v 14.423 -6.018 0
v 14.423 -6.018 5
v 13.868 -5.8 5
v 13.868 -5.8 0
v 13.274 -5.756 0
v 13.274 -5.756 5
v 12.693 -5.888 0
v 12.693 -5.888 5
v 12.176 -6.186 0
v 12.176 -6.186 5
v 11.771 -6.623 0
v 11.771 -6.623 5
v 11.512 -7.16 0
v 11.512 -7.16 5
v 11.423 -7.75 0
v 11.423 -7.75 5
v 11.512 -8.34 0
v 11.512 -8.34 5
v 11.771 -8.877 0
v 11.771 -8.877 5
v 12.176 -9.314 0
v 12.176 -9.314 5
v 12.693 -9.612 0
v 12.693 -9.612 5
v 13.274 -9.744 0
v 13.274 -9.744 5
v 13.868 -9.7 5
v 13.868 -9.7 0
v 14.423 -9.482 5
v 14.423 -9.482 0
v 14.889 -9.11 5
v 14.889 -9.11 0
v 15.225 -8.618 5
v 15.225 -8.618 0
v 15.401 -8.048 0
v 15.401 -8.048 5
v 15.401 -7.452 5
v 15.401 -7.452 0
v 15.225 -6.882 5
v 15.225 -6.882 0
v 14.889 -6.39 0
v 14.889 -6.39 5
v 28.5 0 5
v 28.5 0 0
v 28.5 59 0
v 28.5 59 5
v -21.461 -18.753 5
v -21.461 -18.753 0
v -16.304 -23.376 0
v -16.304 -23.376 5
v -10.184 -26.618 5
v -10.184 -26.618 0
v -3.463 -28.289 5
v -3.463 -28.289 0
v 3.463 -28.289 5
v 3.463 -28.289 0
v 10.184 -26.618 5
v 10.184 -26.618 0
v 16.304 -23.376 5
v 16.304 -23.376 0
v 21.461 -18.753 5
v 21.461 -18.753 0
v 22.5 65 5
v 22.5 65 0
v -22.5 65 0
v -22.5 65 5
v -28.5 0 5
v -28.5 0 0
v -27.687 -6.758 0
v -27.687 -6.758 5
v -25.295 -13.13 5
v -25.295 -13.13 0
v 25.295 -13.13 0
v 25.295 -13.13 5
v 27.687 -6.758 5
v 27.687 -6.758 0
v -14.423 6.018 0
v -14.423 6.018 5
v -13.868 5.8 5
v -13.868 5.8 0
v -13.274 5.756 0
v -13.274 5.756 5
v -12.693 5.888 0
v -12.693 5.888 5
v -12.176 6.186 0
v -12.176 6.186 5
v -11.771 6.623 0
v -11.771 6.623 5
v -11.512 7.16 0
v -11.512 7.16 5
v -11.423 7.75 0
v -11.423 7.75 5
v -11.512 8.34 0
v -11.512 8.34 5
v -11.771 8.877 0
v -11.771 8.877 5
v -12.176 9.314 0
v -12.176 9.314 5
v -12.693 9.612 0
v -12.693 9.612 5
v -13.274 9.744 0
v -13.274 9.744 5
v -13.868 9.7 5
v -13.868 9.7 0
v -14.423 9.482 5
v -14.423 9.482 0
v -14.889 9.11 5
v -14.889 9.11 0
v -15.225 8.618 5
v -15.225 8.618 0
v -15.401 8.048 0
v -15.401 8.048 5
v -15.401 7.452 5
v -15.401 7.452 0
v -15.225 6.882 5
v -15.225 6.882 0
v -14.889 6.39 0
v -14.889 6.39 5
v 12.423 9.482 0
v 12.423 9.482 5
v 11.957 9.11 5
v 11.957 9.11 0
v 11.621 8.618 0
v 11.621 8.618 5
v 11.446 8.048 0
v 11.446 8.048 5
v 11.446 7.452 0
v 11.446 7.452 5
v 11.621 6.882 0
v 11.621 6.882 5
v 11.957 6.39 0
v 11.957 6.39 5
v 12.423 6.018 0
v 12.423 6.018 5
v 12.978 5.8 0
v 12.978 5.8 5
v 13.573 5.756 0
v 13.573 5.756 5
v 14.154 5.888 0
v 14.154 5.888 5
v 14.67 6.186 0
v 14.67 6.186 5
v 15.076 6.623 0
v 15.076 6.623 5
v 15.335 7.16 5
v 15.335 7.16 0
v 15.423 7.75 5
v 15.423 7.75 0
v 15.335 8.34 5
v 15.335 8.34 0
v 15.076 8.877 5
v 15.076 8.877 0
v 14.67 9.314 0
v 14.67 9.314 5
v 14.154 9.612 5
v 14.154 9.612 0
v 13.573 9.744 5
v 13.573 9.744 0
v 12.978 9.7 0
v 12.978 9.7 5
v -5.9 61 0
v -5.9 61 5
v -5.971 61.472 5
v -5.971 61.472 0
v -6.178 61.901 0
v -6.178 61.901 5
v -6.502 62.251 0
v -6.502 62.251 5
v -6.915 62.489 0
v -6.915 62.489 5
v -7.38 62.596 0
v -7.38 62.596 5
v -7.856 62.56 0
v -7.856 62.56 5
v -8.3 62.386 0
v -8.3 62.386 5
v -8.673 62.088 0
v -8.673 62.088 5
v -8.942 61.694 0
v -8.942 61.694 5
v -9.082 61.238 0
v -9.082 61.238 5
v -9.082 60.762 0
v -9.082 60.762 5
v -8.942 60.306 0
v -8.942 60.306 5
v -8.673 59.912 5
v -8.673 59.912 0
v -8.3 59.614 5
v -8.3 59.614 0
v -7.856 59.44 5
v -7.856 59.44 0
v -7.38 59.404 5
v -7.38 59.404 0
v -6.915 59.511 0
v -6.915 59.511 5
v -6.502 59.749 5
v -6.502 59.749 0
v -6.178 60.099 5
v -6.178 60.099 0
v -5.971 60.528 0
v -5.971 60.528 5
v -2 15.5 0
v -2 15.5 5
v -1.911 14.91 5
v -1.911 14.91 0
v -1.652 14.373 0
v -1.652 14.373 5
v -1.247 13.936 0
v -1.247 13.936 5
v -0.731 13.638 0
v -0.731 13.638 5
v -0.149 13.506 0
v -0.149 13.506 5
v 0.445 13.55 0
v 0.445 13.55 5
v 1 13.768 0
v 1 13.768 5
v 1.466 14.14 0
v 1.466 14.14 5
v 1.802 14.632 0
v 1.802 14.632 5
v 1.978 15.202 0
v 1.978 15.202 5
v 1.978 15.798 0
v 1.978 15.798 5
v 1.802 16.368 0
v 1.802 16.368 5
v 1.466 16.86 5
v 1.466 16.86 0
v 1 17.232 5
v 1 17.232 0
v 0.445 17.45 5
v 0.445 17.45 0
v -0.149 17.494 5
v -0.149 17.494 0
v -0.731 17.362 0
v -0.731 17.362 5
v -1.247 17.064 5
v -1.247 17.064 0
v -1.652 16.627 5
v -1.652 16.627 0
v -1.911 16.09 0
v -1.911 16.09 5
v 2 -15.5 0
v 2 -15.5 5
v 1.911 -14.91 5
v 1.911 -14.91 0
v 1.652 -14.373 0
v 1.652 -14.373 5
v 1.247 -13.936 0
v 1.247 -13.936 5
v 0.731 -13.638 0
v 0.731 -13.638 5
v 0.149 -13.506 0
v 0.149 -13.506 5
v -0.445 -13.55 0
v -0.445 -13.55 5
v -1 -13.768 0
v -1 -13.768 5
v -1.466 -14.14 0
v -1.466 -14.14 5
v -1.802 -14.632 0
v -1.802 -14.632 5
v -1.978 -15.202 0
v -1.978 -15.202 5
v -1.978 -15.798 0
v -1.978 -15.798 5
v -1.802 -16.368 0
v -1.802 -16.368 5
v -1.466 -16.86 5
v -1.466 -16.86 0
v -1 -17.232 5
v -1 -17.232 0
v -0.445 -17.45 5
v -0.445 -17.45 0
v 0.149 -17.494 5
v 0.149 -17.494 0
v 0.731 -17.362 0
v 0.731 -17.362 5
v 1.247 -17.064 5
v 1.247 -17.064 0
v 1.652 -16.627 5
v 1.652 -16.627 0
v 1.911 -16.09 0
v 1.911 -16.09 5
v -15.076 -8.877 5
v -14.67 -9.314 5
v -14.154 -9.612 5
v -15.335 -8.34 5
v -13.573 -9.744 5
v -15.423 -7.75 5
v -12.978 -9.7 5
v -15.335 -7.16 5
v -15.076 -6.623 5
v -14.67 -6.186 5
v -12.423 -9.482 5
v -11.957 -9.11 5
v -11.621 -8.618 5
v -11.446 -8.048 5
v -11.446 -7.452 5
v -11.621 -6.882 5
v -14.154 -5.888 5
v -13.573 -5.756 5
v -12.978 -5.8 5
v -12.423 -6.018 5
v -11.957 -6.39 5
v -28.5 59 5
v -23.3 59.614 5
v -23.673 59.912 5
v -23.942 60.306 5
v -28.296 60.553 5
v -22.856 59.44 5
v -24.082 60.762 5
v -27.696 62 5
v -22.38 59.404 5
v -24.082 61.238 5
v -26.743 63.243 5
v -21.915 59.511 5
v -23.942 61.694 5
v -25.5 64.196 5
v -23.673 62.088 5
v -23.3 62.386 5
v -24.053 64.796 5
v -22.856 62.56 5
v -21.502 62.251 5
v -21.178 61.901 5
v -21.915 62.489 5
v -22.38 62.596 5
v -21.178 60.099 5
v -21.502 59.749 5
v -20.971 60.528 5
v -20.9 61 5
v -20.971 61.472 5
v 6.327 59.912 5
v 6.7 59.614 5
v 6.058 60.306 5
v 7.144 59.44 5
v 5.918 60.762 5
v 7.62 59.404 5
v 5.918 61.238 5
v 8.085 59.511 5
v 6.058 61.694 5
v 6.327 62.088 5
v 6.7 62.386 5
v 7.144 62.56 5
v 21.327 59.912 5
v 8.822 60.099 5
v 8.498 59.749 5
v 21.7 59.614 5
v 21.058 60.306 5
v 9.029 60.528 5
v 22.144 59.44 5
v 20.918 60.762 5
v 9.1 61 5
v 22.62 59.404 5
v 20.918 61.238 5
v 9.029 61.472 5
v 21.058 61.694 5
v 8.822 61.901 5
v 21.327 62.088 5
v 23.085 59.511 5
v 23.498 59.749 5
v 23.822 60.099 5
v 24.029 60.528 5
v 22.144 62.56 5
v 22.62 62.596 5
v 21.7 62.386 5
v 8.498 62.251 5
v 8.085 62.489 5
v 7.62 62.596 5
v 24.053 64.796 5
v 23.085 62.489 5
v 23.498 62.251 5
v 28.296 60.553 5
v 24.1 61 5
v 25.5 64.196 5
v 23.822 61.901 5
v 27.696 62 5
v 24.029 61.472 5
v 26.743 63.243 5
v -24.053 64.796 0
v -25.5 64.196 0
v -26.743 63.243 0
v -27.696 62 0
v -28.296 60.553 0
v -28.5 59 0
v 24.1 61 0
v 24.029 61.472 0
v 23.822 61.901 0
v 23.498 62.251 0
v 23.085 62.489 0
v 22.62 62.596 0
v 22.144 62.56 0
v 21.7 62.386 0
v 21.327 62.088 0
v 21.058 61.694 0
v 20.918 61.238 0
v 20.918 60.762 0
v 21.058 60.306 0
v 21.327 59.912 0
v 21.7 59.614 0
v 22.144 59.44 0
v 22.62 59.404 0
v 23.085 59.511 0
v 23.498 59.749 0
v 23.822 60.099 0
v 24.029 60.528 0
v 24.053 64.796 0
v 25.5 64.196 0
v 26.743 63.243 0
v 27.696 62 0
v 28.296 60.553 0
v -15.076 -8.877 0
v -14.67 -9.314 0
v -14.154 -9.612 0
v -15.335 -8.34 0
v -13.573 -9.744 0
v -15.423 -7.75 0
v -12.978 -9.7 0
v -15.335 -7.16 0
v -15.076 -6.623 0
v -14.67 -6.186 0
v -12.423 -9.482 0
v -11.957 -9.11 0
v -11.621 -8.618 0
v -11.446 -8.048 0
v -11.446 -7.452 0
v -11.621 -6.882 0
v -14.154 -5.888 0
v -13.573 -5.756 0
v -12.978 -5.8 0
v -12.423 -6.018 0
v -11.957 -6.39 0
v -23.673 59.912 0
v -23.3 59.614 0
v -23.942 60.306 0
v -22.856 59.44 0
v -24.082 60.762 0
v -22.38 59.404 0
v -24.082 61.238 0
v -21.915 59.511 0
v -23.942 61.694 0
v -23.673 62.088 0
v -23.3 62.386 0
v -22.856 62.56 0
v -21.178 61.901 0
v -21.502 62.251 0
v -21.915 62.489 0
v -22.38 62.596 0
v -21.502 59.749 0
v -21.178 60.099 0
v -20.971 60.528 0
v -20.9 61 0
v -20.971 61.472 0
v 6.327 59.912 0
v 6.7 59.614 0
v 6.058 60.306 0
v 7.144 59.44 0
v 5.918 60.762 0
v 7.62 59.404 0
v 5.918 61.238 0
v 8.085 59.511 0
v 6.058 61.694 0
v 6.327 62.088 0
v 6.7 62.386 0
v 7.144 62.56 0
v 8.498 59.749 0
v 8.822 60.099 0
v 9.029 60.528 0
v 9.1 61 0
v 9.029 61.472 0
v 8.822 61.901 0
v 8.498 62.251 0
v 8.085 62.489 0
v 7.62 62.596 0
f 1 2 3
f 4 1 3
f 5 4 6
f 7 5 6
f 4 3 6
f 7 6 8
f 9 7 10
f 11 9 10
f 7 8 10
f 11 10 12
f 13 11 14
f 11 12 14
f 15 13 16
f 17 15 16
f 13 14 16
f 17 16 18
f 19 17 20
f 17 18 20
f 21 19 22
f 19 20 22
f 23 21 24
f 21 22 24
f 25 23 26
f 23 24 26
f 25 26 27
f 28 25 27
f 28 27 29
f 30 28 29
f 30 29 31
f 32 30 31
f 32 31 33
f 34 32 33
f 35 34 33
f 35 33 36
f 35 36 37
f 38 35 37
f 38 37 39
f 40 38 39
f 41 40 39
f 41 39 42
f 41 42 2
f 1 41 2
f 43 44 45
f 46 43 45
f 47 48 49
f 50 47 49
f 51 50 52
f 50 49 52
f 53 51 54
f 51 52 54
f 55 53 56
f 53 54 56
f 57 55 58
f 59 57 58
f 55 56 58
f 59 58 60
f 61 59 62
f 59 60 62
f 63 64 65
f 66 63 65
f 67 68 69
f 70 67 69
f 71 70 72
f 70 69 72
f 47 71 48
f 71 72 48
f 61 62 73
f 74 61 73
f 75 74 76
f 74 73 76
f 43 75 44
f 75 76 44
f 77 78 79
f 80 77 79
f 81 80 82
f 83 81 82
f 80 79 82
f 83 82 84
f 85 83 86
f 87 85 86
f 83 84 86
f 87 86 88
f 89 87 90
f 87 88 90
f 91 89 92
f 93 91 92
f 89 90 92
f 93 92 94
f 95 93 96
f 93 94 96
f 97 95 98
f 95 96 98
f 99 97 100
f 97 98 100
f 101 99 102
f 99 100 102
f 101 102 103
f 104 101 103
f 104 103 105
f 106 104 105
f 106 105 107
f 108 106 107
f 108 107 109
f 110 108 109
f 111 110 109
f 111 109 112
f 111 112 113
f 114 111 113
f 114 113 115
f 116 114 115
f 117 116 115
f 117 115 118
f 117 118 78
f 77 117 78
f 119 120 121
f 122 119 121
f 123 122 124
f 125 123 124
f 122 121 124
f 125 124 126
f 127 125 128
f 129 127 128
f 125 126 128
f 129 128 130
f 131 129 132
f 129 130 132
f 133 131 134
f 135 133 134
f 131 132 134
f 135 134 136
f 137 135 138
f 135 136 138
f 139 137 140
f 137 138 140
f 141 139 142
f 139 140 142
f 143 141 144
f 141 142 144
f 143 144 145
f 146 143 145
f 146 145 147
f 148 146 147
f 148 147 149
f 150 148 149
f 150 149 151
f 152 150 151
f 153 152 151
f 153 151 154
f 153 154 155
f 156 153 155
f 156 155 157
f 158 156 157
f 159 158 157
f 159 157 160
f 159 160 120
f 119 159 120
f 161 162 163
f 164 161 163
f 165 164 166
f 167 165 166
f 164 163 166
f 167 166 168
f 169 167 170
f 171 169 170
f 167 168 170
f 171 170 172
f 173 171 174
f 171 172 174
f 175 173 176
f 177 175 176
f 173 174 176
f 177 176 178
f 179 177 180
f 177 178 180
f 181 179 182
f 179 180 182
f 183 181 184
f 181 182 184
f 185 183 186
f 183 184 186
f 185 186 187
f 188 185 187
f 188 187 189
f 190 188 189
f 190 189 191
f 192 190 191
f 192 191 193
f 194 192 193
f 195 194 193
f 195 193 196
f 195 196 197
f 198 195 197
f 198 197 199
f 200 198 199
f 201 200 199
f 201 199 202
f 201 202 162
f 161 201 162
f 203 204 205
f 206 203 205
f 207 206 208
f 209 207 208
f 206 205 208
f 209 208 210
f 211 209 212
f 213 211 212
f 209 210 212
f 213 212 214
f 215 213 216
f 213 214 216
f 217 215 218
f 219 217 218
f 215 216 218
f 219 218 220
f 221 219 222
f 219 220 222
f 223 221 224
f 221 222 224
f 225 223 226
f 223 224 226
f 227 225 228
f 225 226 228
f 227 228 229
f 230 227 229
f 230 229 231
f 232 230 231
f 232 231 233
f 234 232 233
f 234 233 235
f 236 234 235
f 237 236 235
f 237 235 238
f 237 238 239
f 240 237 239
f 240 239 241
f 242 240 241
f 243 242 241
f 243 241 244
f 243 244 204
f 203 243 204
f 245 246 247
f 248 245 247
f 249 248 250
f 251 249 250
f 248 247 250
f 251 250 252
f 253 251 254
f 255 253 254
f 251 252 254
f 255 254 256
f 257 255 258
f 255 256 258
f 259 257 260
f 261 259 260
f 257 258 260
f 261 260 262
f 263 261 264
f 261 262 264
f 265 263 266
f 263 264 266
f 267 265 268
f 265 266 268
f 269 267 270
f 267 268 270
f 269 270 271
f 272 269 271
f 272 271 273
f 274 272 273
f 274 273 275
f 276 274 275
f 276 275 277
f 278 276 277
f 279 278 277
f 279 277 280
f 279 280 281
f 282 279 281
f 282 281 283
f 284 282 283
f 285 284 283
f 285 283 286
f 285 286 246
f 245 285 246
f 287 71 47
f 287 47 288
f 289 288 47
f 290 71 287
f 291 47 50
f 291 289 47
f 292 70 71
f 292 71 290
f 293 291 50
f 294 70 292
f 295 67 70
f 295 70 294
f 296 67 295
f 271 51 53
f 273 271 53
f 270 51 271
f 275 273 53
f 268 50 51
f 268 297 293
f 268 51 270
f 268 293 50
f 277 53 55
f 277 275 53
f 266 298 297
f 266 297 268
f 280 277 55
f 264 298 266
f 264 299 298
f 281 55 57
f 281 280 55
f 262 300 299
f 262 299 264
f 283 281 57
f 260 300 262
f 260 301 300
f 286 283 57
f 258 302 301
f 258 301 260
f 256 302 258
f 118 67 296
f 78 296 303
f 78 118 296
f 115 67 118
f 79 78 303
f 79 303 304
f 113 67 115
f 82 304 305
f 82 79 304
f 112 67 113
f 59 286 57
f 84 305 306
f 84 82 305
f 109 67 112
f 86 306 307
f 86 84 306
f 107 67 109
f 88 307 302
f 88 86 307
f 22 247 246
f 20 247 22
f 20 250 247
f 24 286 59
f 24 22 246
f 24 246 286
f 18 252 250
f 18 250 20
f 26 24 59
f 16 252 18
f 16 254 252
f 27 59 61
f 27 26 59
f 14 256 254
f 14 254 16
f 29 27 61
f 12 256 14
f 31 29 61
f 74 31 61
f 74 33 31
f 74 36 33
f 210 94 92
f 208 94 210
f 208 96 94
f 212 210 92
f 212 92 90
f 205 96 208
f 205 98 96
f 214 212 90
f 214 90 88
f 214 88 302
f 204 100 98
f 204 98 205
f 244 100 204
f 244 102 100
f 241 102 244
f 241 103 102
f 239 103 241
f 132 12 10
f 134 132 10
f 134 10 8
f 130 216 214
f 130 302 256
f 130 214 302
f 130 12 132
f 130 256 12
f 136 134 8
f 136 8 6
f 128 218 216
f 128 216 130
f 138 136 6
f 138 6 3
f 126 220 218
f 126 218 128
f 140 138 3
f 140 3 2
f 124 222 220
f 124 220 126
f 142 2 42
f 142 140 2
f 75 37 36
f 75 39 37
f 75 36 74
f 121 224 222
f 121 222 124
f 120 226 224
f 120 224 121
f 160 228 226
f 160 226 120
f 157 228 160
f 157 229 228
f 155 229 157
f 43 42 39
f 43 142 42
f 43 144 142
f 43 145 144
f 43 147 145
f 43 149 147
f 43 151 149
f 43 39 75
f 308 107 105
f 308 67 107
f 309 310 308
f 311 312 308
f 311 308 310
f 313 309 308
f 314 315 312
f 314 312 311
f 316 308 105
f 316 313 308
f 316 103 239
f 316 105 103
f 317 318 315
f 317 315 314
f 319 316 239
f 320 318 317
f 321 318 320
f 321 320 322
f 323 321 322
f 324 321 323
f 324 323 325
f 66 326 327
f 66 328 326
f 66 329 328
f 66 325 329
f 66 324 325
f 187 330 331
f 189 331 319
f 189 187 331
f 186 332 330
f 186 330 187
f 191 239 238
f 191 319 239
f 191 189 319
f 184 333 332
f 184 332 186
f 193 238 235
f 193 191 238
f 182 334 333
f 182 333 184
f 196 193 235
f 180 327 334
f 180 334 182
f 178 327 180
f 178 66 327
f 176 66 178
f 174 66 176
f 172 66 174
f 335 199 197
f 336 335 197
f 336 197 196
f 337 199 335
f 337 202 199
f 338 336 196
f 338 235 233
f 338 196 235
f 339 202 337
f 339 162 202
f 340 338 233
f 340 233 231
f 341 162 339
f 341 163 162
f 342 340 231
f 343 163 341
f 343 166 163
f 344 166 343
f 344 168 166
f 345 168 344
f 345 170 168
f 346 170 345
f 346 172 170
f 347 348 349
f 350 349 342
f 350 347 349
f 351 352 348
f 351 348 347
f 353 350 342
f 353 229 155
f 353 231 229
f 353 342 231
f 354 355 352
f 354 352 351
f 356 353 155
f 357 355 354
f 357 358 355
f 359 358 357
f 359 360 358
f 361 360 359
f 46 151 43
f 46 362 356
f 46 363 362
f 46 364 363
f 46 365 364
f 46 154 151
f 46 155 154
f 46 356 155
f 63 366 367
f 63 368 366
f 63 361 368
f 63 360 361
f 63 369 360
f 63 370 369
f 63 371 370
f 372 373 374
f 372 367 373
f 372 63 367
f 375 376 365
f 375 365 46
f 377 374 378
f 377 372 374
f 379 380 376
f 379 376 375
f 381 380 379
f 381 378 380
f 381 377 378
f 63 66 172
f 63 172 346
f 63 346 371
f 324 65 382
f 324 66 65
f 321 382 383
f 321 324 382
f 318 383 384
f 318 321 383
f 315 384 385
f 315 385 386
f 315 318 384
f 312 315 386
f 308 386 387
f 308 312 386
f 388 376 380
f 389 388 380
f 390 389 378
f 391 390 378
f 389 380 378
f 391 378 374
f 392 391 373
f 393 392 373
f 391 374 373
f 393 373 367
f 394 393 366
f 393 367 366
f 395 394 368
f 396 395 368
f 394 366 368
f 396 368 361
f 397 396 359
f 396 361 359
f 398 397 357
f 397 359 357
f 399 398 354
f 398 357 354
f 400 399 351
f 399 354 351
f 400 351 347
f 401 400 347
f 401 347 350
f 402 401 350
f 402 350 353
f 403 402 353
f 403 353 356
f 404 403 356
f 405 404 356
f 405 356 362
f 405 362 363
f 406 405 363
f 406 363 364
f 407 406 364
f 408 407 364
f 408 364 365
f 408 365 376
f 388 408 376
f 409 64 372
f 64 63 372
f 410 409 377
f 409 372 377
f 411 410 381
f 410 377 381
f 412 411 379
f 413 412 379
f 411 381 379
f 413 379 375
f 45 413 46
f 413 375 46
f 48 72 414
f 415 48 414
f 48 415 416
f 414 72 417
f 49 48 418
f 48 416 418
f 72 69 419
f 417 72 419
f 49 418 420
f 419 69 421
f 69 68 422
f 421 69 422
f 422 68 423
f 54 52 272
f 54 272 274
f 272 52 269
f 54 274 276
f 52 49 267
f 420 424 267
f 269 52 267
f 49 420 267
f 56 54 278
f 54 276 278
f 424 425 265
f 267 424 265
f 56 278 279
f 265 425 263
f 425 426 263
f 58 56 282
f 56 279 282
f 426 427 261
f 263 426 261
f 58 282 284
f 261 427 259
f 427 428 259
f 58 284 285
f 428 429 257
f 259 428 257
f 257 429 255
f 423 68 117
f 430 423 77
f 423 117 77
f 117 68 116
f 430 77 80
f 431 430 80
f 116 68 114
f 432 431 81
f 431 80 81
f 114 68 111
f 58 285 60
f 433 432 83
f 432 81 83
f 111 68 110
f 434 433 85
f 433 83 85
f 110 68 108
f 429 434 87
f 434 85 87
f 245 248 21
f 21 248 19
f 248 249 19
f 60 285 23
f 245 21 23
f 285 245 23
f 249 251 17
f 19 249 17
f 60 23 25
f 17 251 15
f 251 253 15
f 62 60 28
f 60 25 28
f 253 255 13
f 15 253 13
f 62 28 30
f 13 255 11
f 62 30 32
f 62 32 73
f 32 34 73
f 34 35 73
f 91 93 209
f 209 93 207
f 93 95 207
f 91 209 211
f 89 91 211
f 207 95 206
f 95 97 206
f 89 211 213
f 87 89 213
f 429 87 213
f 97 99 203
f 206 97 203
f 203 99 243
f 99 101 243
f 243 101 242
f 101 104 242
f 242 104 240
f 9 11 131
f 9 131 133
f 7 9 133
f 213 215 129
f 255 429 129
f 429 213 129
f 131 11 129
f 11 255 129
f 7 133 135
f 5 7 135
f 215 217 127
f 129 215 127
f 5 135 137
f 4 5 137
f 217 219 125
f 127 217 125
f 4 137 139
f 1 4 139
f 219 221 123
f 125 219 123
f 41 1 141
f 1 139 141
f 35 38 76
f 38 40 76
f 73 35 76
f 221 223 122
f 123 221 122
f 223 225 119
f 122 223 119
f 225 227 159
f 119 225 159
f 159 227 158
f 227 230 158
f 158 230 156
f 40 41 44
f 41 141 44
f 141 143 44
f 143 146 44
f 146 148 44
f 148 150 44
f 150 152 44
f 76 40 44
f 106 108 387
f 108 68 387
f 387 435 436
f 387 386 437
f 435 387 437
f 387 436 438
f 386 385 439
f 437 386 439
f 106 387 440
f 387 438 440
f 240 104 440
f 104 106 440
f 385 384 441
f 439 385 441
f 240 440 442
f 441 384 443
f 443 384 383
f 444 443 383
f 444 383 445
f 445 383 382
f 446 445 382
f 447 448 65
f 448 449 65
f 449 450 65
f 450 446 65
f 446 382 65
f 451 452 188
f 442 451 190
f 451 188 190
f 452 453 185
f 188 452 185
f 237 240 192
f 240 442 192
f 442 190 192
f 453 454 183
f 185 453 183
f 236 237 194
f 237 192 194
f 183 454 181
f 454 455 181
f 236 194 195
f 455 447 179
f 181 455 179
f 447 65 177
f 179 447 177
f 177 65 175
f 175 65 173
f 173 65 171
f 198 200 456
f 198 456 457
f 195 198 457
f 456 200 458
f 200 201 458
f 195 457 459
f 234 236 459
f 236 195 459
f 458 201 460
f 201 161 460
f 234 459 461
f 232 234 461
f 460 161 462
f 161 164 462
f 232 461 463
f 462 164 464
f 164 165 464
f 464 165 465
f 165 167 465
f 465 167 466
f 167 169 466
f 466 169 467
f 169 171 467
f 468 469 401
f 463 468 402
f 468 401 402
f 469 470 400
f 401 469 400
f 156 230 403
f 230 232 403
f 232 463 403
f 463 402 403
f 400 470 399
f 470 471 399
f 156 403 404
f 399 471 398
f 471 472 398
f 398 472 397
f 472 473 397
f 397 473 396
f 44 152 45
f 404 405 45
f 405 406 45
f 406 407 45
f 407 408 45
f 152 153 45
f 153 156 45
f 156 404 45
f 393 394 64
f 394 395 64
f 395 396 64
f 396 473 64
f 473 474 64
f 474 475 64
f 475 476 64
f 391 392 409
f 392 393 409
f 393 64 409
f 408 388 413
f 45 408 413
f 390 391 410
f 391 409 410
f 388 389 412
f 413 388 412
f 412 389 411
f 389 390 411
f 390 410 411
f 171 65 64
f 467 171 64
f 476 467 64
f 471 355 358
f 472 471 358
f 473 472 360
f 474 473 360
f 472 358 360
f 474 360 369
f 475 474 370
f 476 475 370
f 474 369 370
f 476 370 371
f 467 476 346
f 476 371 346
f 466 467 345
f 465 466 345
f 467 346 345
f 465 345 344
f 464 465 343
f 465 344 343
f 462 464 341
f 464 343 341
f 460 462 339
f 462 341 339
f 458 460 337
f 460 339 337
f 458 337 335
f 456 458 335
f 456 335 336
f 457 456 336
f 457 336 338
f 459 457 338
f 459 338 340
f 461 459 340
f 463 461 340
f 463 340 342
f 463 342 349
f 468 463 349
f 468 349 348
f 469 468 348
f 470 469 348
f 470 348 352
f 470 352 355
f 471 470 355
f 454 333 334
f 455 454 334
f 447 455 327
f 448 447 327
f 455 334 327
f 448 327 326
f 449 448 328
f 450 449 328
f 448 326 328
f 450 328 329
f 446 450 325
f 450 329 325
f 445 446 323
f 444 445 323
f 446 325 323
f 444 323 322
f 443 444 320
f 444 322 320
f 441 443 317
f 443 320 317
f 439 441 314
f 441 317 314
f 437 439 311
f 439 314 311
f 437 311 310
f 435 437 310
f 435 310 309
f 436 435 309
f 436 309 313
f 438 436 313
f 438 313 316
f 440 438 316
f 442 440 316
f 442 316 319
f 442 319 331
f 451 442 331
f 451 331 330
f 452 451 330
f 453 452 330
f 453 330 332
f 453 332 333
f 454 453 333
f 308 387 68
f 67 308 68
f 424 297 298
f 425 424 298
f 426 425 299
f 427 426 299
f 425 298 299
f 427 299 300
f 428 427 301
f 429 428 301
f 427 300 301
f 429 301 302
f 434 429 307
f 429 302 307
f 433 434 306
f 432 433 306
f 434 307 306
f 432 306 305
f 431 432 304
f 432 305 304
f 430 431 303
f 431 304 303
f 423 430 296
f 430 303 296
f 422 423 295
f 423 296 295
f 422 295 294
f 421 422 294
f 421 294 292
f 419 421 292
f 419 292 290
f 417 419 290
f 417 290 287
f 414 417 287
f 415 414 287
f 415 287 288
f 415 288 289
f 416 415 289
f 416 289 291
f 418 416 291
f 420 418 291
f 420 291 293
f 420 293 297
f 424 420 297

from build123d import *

# Parameters (mm, degrees)
EXTRUDE_1_DEPTH          = 5
CUT_EXTRUDE_2_REACH      = 73.149
SKETCH_4_R               = 2
SKETCH_5_OUTSIDE_W       = 80.924
SKETCH_5_OUTSIDE_H       = 117.424
SKETCH_5_OUTSIDE_R       = 1.6
CUT_EXTRUDE_3_DEPTH      = 72.149490511
FILLET_1_R               = 6
FILLET_2_R               = 6
PATTERN_CIRCULAR_1_COUNT = 6


with BuildPart() as part:
    # 草圖1 → 填料-伸長1 (new body)
    with BuildSketch(Plane.XY):
        with BuildLine():
            Line((28.5, 65), (-28.5, 65))
            Line((-28.5, 65), (-28.5, 55))
            Line((-28.5, 55), (-28.5, 0))
            ThreePointArc((-28.5, 0), (-26.682182849, -10.015543839), (-21.46062327, -18.753443653))
            ThreePointArc((-21.46062327, -18.753443653), (0, -28.5), (21.46062327, -18.753443653))
            ThreePointArc((21.46062327, -18.753443653), (26.682182849, -10.015543839), (28.5, 0))
            Line((28.5, 0), (28.5, 55.020450743))
            Line((28.5, 55.020450743), (28.5, 65))
        make_face()
    extrude(amount=EXTRUDE_1_DEPTH)

    # 草圖4 → 除料-伸長2 (cut, up to next)
    with BuildSketch(Plane.XY.offset(5), mode=Mode.PRIVATE) as cut_extrude_2_sk1:
        with Locations((0, -15.5)):
            Circle(SKETCH_4_R)
    cut_extrude_2_tool1 = extrude(cut_extrude_2_sk1.sketch, amount=-CUT_EXTRUDE_2_REACH, mode=Mode.PRIVATE) & part.part
    cut_extrude_2 = cut_extrude_2_tool1.solids().sort_by_distance((0, -15.5, 5))[0]
    add(cut_extrude_2, mode=Mode.SUBTRACT)

    # 草圖5 outside → 除料-伸長3 (cut, through all)
    # profile 1 of 5: a face of its own
    with BuildSketch(Plane.XY.offset(5)):
        with Locations((0, 18.25)):
            Rectangle(SKETCH_5_OUTSIDE_W, SKETCH_5_OUTSIDE_H)
        with BuildLine():
            Line((28.5, 65), (-28.5, 65))
            Line((-28.5, 65), (-28.5, 0))
            ThreePointArc((-28.5, 0), (0, -28.5), (28.5, 0))
            Line((28.5, 0), (28.5, 65))
        make_face(mode=Mode.SUBTRACT)
    # profile 2 of 5: a face of its own
    with BuildSketch(Plane.XY.offset(5)):
        with Locations((22.5, 61)):
            Circle(SKETCH_5_OUTSIDE_R)
    # profile 3 of 5: a face of its own
    with BuildSketch(Plane.XY.offset(5)):
        with Locations((7.5, 61)):
            Circle(SKETCH_5_OUTSIDE_R)
    # profile 4 of 5: a face of its own
    with BuildSketch(Plane.XY.offset(5)):
        with Locations((-7.5, 61)):
            Circle(SKETCH_5_OUTSIDE_R)
    # profile 5 of 5: a face of its own
    with BuildSketch(Plane.XY.offset(5)):
        with Locations((-22.5, 61)):
            Circle(SKETCH_5_OUTSIDE_R)
    extrude(amount=-CUT_EXTRUDE_3_DEPTH, mode=Mode.SUBTRACT)

    # 圓角1
    fillet_1_edges = [part.edges().sort_by_distance(p)[0] for p in [
        (-28.5, 65, 2.5),
    ]]
    fillet(fillet_1_edges, radius=FILLET_1_R)

    # 圓角2
    fillet_2_edges = [part.edges().sort_by_distance(p)[0] for p in [
        (28.5, 65, 2.5),
    ]]
    fillet(fillet_2_edges, radius=FILLET_2_R)

    # 環狀複製排列1: 除料-伸長2 ×6 about axis
    pattern_circular_1_axis = Axis((0, 0, 0), (0, 0, 1))
    for i in range(1, PATTERN_CIRCULAR_1_COUNT):
        add(cut_extrude_2.rotate(pattern_circular_1_axis, i * 360 / PATTERN_CIRCULAR_1_COUNT), mode=Mode.SUBTRACT)


solid = part.part
